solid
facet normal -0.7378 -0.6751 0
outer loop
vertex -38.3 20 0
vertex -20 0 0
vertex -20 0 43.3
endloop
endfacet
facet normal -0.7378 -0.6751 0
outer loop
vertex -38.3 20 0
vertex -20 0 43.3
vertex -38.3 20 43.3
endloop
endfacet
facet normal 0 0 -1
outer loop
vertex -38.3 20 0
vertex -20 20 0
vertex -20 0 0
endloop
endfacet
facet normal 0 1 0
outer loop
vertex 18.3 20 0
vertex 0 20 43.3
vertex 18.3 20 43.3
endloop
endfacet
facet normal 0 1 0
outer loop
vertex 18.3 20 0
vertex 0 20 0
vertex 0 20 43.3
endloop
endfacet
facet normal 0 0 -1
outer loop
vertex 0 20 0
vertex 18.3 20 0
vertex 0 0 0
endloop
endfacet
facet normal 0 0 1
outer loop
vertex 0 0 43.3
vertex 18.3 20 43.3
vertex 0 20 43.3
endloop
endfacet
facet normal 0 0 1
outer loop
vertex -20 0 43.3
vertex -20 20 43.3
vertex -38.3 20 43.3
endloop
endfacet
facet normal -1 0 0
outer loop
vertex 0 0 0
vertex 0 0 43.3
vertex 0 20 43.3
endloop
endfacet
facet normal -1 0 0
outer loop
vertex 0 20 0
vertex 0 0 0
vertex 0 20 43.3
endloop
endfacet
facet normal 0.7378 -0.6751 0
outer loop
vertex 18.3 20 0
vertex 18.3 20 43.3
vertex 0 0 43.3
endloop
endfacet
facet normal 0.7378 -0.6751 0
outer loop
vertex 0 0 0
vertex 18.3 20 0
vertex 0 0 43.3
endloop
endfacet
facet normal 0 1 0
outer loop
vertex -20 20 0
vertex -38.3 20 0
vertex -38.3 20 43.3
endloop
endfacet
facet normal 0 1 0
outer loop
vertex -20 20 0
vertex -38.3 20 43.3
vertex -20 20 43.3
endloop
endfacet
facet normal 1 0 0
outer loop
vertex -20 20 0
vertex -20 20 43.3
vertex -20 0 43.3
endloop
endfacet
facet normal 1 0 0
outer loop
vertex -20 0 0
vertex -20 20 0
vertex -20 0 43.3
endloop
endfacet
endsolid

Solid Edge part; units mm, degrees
sketch "Sketch1" plane through (0, 0, 0) normal (0, 0, 1) x (1, 0, 0)
  line L0 (0, 20) -> (18.3, 20)
  line L1 (18.3, 20) -> (0, 0)
  line L2 (0, 0) -> (0, 20)
extrude "Protrusion1" add sketch "Sketch1" along normal blind 43.3
mirror "Mirror1" about plane through (-10, 10, 21.65) normal (-1, 0, 0) of "Protrusion1"
